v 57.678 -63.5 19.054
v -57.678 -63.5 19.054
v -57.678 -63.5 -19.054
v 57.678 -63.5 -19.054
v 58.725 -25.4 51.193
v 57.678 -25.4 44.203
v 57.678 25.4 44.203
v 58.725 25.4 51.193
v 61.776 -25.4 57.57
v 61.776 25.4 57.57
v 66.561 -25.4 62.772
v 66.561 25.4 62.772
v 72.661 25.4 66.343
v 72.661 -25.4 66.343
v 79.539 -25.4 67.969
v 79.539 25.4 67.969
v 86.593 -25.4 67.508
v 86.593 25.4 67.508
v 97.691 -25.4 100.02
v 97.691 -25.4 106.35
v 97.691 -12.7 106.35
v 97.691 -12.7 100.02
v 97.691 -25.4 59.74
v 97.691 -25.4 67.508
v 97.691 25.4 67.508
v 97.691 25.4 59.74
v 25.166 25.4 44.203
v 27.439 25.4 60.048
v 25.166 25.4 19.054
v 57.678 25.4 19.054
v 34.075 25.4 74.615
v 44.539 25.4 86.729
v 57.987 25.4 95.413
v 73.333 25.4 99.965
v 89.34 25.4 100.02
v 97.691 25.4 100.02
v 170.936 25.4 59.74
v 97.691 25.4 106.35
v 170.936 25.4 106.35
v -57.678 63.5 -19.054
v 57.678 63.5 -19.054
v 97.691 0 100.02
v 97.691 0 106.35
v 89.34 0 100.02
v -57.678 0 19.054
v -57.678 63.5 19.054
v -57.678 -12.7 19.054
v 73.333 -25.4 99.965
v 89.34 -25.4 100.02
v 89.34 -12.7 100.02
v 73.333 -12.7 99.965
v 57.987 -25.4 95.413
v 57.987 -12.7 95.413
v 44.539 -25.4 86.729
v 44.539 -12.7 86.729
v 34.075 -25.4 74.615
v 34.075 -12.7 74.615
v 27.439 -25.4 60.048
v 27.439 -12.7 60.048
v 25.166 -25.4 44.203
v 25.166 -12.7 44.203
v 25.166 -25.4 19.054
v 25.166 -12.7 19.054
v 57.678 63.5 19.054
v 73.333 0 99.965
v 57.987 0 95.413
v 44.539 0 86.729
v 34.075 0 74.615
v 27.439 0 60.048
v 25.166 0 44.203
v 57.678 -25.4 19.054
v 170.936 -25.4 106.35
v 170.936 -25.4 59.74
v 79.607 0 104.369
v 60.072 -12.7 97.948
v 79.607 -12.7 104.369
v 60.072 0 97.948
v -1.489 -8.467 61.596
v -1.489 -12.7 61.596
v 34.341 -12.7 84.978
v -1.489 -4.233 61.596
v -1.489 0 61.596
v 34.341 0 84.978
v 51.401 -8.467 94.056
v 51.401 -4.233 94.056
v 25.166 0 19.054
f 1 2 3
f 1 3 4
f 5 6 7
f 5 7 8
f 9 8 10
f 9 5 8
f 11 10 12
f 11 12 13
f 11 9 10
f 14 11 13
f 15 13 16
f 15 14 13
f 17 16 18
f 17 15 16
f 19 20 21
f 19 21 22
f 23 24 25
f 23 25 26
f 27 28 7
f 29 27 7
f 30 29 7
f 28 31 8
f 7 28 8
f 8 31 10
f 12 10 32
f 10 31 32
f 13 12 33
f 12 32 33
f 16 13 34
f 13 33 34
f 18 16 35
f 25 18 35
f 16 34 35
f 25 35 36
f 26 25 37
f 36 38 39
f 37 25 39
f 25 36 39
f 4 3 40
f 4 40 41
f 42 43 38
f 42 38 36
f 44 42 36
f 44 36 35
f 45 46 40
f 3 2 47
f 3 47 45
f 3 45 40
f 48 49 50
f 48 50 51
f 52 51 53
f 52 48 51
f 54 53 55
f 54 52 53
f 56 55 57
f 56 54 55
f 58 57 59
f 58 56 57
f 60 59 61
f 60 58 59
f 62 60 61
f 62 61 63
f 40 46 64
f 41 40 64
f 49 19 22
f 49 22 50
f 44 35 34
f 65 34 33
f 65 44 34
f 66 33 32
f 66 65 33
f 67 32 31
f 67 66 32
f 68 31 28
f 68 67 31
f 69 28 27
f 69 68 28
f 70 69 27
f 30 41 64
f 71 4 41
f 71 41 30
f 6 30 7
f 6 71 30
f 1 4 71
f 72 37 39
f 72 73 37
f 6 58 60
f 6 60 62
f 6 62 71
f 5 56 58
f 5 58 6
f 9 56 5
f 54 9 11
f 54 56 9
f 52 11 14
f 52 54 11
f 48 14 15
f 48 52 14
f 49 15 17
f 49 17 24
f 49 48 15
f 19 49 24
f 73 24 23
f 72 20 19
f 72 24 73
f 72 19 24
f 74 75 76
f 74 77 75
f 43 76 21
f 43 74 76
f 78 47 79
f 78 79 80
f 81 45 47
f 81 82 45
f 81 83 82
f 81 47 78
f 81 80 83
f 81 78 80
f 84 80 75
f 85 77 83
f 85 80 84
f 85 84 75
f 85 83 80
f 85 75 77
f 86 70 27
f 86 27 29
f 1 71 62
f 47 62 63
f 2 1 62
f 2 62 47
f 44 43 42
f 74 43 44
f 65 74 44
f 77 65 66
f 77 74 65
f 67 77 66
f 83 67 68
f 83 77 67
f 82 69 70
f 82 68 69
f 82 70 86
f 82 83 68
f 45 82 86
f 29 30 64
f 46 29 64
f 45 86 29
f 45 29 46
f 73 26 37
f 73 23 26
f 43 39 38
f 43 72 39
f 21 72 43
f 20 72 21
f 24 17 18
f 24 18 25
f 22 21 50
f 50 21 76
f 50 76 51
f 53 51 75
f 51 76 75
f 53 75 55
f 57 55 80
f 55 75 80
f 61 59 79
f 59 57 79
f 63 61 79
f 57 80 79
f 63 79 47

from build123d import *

# Parameters (mm, degrees)
F1_DEPTH = 63.5
F2_DEPTH = 25.4
F3_DEPTH = 12.7


with BuildPart() as f1:
    # F0 (on Front) → F1 (new body, symmetric)
    with BuildSketch(Plane.XZ):
        Polygon((-57.6780065894, 19.0542247146), (-57.6780065894, -19.0542247146), (57.6780065894, -19.0542247146), (57.6780065894, 19.0542247146), (25.1660067588, 19.0542247146), align=None)
    extrude(amount=F1_DEPTH, both=True)

    # F0 (on Front) → F2 (join, symmetric)
    with BuildSketch(Plane.XZ):
        with BuildLine():
            Line((170.935690403, 106.350377202), (97.6905226707, 106.350377202))
            add(Edge.make_bspline(
                [(97.6905226707, 106.350377202), (126.9282830626, 105.5487369377), (148.9319867328, 82.6442750732), (170.935690403, 59.7398132086)],
                knots=[0.5889393883, 0.5889393883, 0.5889393883, 0.5889393883, 1, 1, 1, 1], degree=3))
            Line((170.935690403, 59.7398132086), (170.935690403, 106.350377202))
        make_face()
        with BuildLine():
            add(Edge.make_bspline(
                [(97.6905226707, 106.350377202), (126.9282830626, 105.5487369377), (148.9319867328, 82.6442750732), (170.935690403, 59.7398132086)],
                knots=[0.5889393883, 0.5889393883, 0.5889393883, 0.5889393883, 1, 1, 1, 1], degree=3))
            Line((97.6905226707, 106.350377202), (97.6905226707, 100.020242855))
            Line((97.6905226707, 100.020242855), (97.6905226707, 67.5082430243))
            Line((97.6905226707, 67.5082430243), (97.6905226707, 59.7398132086))
            Line((97.6905226707, 59.7398132086), (170.935690403, 59.7398132086))
        make_face()
        with BuildLine():
            Line((25.1660067588, 19.0542247146), (57.6780065894, 19.0542247146))
            Line((57.6780065894, 19.0542247146), (57.6780065894, 44.2029610276))
            ThreePointArc((57.6780065894, 44.2029610276), (66.5609775012, 62.7717505439), (86.5927711129, 67.5082430243))
            Line((86.5927711129, 67.5082430243), (97.6905226707, 67.5082430243))
            Line((97.6905226707, 67.5082430243), (97.6905226707, 100.020242855))
            Line((97.6905226707, 100.020242855), (89.3401460729, 100.020242855))
            ThreePointArc((89.3401460729, 100.020242855), (44.5390942152, 86.7290974242), (25.1660067588, 44.2029610276))
            Line((25.1660067588, 44.2029610276), (25.1660067588, 19.0542247146))
        make_face()
    extrude(amount=F2_DEPTH, both=True)

    # F0 (on Front) → F3 (join)
    with BuildSketch(Plane.XZ):
        with BuildLine():
            add(Edge.make_bspline(
                [(-57.6780065894, 19.0542247146), (-0.9386686045, 63.2765684914), (55.8006693804, 107.4989122681), (97.6905226707, 106.350377202)],
                knots=[0, 0, 0, 0, 0.5889393883, 0.5889393883, 0.5889393883, 0.5889393883], degree=3))
            Line((-57.6780065894, 19.0542247146), (25.1660067588, 19.0542247146))
            Line((25.1660067588, 19.0542247146), (25.1660067588, 44.2029610276))
            ThreePointArc((25.1660067588, 44.2029610276), (44.5390942152, 86.7290974242), (89.3401460729, 100.020242855))
            Line((89.3401460729, 100.020242855), (97.6905226707, 100.020242855))
            Line((97.6905226707, 100.020242855), (97.6905226707, 106.350377202))
        make_face()
    extrude(amount=F3_DEPTH)


solid = f1.part
